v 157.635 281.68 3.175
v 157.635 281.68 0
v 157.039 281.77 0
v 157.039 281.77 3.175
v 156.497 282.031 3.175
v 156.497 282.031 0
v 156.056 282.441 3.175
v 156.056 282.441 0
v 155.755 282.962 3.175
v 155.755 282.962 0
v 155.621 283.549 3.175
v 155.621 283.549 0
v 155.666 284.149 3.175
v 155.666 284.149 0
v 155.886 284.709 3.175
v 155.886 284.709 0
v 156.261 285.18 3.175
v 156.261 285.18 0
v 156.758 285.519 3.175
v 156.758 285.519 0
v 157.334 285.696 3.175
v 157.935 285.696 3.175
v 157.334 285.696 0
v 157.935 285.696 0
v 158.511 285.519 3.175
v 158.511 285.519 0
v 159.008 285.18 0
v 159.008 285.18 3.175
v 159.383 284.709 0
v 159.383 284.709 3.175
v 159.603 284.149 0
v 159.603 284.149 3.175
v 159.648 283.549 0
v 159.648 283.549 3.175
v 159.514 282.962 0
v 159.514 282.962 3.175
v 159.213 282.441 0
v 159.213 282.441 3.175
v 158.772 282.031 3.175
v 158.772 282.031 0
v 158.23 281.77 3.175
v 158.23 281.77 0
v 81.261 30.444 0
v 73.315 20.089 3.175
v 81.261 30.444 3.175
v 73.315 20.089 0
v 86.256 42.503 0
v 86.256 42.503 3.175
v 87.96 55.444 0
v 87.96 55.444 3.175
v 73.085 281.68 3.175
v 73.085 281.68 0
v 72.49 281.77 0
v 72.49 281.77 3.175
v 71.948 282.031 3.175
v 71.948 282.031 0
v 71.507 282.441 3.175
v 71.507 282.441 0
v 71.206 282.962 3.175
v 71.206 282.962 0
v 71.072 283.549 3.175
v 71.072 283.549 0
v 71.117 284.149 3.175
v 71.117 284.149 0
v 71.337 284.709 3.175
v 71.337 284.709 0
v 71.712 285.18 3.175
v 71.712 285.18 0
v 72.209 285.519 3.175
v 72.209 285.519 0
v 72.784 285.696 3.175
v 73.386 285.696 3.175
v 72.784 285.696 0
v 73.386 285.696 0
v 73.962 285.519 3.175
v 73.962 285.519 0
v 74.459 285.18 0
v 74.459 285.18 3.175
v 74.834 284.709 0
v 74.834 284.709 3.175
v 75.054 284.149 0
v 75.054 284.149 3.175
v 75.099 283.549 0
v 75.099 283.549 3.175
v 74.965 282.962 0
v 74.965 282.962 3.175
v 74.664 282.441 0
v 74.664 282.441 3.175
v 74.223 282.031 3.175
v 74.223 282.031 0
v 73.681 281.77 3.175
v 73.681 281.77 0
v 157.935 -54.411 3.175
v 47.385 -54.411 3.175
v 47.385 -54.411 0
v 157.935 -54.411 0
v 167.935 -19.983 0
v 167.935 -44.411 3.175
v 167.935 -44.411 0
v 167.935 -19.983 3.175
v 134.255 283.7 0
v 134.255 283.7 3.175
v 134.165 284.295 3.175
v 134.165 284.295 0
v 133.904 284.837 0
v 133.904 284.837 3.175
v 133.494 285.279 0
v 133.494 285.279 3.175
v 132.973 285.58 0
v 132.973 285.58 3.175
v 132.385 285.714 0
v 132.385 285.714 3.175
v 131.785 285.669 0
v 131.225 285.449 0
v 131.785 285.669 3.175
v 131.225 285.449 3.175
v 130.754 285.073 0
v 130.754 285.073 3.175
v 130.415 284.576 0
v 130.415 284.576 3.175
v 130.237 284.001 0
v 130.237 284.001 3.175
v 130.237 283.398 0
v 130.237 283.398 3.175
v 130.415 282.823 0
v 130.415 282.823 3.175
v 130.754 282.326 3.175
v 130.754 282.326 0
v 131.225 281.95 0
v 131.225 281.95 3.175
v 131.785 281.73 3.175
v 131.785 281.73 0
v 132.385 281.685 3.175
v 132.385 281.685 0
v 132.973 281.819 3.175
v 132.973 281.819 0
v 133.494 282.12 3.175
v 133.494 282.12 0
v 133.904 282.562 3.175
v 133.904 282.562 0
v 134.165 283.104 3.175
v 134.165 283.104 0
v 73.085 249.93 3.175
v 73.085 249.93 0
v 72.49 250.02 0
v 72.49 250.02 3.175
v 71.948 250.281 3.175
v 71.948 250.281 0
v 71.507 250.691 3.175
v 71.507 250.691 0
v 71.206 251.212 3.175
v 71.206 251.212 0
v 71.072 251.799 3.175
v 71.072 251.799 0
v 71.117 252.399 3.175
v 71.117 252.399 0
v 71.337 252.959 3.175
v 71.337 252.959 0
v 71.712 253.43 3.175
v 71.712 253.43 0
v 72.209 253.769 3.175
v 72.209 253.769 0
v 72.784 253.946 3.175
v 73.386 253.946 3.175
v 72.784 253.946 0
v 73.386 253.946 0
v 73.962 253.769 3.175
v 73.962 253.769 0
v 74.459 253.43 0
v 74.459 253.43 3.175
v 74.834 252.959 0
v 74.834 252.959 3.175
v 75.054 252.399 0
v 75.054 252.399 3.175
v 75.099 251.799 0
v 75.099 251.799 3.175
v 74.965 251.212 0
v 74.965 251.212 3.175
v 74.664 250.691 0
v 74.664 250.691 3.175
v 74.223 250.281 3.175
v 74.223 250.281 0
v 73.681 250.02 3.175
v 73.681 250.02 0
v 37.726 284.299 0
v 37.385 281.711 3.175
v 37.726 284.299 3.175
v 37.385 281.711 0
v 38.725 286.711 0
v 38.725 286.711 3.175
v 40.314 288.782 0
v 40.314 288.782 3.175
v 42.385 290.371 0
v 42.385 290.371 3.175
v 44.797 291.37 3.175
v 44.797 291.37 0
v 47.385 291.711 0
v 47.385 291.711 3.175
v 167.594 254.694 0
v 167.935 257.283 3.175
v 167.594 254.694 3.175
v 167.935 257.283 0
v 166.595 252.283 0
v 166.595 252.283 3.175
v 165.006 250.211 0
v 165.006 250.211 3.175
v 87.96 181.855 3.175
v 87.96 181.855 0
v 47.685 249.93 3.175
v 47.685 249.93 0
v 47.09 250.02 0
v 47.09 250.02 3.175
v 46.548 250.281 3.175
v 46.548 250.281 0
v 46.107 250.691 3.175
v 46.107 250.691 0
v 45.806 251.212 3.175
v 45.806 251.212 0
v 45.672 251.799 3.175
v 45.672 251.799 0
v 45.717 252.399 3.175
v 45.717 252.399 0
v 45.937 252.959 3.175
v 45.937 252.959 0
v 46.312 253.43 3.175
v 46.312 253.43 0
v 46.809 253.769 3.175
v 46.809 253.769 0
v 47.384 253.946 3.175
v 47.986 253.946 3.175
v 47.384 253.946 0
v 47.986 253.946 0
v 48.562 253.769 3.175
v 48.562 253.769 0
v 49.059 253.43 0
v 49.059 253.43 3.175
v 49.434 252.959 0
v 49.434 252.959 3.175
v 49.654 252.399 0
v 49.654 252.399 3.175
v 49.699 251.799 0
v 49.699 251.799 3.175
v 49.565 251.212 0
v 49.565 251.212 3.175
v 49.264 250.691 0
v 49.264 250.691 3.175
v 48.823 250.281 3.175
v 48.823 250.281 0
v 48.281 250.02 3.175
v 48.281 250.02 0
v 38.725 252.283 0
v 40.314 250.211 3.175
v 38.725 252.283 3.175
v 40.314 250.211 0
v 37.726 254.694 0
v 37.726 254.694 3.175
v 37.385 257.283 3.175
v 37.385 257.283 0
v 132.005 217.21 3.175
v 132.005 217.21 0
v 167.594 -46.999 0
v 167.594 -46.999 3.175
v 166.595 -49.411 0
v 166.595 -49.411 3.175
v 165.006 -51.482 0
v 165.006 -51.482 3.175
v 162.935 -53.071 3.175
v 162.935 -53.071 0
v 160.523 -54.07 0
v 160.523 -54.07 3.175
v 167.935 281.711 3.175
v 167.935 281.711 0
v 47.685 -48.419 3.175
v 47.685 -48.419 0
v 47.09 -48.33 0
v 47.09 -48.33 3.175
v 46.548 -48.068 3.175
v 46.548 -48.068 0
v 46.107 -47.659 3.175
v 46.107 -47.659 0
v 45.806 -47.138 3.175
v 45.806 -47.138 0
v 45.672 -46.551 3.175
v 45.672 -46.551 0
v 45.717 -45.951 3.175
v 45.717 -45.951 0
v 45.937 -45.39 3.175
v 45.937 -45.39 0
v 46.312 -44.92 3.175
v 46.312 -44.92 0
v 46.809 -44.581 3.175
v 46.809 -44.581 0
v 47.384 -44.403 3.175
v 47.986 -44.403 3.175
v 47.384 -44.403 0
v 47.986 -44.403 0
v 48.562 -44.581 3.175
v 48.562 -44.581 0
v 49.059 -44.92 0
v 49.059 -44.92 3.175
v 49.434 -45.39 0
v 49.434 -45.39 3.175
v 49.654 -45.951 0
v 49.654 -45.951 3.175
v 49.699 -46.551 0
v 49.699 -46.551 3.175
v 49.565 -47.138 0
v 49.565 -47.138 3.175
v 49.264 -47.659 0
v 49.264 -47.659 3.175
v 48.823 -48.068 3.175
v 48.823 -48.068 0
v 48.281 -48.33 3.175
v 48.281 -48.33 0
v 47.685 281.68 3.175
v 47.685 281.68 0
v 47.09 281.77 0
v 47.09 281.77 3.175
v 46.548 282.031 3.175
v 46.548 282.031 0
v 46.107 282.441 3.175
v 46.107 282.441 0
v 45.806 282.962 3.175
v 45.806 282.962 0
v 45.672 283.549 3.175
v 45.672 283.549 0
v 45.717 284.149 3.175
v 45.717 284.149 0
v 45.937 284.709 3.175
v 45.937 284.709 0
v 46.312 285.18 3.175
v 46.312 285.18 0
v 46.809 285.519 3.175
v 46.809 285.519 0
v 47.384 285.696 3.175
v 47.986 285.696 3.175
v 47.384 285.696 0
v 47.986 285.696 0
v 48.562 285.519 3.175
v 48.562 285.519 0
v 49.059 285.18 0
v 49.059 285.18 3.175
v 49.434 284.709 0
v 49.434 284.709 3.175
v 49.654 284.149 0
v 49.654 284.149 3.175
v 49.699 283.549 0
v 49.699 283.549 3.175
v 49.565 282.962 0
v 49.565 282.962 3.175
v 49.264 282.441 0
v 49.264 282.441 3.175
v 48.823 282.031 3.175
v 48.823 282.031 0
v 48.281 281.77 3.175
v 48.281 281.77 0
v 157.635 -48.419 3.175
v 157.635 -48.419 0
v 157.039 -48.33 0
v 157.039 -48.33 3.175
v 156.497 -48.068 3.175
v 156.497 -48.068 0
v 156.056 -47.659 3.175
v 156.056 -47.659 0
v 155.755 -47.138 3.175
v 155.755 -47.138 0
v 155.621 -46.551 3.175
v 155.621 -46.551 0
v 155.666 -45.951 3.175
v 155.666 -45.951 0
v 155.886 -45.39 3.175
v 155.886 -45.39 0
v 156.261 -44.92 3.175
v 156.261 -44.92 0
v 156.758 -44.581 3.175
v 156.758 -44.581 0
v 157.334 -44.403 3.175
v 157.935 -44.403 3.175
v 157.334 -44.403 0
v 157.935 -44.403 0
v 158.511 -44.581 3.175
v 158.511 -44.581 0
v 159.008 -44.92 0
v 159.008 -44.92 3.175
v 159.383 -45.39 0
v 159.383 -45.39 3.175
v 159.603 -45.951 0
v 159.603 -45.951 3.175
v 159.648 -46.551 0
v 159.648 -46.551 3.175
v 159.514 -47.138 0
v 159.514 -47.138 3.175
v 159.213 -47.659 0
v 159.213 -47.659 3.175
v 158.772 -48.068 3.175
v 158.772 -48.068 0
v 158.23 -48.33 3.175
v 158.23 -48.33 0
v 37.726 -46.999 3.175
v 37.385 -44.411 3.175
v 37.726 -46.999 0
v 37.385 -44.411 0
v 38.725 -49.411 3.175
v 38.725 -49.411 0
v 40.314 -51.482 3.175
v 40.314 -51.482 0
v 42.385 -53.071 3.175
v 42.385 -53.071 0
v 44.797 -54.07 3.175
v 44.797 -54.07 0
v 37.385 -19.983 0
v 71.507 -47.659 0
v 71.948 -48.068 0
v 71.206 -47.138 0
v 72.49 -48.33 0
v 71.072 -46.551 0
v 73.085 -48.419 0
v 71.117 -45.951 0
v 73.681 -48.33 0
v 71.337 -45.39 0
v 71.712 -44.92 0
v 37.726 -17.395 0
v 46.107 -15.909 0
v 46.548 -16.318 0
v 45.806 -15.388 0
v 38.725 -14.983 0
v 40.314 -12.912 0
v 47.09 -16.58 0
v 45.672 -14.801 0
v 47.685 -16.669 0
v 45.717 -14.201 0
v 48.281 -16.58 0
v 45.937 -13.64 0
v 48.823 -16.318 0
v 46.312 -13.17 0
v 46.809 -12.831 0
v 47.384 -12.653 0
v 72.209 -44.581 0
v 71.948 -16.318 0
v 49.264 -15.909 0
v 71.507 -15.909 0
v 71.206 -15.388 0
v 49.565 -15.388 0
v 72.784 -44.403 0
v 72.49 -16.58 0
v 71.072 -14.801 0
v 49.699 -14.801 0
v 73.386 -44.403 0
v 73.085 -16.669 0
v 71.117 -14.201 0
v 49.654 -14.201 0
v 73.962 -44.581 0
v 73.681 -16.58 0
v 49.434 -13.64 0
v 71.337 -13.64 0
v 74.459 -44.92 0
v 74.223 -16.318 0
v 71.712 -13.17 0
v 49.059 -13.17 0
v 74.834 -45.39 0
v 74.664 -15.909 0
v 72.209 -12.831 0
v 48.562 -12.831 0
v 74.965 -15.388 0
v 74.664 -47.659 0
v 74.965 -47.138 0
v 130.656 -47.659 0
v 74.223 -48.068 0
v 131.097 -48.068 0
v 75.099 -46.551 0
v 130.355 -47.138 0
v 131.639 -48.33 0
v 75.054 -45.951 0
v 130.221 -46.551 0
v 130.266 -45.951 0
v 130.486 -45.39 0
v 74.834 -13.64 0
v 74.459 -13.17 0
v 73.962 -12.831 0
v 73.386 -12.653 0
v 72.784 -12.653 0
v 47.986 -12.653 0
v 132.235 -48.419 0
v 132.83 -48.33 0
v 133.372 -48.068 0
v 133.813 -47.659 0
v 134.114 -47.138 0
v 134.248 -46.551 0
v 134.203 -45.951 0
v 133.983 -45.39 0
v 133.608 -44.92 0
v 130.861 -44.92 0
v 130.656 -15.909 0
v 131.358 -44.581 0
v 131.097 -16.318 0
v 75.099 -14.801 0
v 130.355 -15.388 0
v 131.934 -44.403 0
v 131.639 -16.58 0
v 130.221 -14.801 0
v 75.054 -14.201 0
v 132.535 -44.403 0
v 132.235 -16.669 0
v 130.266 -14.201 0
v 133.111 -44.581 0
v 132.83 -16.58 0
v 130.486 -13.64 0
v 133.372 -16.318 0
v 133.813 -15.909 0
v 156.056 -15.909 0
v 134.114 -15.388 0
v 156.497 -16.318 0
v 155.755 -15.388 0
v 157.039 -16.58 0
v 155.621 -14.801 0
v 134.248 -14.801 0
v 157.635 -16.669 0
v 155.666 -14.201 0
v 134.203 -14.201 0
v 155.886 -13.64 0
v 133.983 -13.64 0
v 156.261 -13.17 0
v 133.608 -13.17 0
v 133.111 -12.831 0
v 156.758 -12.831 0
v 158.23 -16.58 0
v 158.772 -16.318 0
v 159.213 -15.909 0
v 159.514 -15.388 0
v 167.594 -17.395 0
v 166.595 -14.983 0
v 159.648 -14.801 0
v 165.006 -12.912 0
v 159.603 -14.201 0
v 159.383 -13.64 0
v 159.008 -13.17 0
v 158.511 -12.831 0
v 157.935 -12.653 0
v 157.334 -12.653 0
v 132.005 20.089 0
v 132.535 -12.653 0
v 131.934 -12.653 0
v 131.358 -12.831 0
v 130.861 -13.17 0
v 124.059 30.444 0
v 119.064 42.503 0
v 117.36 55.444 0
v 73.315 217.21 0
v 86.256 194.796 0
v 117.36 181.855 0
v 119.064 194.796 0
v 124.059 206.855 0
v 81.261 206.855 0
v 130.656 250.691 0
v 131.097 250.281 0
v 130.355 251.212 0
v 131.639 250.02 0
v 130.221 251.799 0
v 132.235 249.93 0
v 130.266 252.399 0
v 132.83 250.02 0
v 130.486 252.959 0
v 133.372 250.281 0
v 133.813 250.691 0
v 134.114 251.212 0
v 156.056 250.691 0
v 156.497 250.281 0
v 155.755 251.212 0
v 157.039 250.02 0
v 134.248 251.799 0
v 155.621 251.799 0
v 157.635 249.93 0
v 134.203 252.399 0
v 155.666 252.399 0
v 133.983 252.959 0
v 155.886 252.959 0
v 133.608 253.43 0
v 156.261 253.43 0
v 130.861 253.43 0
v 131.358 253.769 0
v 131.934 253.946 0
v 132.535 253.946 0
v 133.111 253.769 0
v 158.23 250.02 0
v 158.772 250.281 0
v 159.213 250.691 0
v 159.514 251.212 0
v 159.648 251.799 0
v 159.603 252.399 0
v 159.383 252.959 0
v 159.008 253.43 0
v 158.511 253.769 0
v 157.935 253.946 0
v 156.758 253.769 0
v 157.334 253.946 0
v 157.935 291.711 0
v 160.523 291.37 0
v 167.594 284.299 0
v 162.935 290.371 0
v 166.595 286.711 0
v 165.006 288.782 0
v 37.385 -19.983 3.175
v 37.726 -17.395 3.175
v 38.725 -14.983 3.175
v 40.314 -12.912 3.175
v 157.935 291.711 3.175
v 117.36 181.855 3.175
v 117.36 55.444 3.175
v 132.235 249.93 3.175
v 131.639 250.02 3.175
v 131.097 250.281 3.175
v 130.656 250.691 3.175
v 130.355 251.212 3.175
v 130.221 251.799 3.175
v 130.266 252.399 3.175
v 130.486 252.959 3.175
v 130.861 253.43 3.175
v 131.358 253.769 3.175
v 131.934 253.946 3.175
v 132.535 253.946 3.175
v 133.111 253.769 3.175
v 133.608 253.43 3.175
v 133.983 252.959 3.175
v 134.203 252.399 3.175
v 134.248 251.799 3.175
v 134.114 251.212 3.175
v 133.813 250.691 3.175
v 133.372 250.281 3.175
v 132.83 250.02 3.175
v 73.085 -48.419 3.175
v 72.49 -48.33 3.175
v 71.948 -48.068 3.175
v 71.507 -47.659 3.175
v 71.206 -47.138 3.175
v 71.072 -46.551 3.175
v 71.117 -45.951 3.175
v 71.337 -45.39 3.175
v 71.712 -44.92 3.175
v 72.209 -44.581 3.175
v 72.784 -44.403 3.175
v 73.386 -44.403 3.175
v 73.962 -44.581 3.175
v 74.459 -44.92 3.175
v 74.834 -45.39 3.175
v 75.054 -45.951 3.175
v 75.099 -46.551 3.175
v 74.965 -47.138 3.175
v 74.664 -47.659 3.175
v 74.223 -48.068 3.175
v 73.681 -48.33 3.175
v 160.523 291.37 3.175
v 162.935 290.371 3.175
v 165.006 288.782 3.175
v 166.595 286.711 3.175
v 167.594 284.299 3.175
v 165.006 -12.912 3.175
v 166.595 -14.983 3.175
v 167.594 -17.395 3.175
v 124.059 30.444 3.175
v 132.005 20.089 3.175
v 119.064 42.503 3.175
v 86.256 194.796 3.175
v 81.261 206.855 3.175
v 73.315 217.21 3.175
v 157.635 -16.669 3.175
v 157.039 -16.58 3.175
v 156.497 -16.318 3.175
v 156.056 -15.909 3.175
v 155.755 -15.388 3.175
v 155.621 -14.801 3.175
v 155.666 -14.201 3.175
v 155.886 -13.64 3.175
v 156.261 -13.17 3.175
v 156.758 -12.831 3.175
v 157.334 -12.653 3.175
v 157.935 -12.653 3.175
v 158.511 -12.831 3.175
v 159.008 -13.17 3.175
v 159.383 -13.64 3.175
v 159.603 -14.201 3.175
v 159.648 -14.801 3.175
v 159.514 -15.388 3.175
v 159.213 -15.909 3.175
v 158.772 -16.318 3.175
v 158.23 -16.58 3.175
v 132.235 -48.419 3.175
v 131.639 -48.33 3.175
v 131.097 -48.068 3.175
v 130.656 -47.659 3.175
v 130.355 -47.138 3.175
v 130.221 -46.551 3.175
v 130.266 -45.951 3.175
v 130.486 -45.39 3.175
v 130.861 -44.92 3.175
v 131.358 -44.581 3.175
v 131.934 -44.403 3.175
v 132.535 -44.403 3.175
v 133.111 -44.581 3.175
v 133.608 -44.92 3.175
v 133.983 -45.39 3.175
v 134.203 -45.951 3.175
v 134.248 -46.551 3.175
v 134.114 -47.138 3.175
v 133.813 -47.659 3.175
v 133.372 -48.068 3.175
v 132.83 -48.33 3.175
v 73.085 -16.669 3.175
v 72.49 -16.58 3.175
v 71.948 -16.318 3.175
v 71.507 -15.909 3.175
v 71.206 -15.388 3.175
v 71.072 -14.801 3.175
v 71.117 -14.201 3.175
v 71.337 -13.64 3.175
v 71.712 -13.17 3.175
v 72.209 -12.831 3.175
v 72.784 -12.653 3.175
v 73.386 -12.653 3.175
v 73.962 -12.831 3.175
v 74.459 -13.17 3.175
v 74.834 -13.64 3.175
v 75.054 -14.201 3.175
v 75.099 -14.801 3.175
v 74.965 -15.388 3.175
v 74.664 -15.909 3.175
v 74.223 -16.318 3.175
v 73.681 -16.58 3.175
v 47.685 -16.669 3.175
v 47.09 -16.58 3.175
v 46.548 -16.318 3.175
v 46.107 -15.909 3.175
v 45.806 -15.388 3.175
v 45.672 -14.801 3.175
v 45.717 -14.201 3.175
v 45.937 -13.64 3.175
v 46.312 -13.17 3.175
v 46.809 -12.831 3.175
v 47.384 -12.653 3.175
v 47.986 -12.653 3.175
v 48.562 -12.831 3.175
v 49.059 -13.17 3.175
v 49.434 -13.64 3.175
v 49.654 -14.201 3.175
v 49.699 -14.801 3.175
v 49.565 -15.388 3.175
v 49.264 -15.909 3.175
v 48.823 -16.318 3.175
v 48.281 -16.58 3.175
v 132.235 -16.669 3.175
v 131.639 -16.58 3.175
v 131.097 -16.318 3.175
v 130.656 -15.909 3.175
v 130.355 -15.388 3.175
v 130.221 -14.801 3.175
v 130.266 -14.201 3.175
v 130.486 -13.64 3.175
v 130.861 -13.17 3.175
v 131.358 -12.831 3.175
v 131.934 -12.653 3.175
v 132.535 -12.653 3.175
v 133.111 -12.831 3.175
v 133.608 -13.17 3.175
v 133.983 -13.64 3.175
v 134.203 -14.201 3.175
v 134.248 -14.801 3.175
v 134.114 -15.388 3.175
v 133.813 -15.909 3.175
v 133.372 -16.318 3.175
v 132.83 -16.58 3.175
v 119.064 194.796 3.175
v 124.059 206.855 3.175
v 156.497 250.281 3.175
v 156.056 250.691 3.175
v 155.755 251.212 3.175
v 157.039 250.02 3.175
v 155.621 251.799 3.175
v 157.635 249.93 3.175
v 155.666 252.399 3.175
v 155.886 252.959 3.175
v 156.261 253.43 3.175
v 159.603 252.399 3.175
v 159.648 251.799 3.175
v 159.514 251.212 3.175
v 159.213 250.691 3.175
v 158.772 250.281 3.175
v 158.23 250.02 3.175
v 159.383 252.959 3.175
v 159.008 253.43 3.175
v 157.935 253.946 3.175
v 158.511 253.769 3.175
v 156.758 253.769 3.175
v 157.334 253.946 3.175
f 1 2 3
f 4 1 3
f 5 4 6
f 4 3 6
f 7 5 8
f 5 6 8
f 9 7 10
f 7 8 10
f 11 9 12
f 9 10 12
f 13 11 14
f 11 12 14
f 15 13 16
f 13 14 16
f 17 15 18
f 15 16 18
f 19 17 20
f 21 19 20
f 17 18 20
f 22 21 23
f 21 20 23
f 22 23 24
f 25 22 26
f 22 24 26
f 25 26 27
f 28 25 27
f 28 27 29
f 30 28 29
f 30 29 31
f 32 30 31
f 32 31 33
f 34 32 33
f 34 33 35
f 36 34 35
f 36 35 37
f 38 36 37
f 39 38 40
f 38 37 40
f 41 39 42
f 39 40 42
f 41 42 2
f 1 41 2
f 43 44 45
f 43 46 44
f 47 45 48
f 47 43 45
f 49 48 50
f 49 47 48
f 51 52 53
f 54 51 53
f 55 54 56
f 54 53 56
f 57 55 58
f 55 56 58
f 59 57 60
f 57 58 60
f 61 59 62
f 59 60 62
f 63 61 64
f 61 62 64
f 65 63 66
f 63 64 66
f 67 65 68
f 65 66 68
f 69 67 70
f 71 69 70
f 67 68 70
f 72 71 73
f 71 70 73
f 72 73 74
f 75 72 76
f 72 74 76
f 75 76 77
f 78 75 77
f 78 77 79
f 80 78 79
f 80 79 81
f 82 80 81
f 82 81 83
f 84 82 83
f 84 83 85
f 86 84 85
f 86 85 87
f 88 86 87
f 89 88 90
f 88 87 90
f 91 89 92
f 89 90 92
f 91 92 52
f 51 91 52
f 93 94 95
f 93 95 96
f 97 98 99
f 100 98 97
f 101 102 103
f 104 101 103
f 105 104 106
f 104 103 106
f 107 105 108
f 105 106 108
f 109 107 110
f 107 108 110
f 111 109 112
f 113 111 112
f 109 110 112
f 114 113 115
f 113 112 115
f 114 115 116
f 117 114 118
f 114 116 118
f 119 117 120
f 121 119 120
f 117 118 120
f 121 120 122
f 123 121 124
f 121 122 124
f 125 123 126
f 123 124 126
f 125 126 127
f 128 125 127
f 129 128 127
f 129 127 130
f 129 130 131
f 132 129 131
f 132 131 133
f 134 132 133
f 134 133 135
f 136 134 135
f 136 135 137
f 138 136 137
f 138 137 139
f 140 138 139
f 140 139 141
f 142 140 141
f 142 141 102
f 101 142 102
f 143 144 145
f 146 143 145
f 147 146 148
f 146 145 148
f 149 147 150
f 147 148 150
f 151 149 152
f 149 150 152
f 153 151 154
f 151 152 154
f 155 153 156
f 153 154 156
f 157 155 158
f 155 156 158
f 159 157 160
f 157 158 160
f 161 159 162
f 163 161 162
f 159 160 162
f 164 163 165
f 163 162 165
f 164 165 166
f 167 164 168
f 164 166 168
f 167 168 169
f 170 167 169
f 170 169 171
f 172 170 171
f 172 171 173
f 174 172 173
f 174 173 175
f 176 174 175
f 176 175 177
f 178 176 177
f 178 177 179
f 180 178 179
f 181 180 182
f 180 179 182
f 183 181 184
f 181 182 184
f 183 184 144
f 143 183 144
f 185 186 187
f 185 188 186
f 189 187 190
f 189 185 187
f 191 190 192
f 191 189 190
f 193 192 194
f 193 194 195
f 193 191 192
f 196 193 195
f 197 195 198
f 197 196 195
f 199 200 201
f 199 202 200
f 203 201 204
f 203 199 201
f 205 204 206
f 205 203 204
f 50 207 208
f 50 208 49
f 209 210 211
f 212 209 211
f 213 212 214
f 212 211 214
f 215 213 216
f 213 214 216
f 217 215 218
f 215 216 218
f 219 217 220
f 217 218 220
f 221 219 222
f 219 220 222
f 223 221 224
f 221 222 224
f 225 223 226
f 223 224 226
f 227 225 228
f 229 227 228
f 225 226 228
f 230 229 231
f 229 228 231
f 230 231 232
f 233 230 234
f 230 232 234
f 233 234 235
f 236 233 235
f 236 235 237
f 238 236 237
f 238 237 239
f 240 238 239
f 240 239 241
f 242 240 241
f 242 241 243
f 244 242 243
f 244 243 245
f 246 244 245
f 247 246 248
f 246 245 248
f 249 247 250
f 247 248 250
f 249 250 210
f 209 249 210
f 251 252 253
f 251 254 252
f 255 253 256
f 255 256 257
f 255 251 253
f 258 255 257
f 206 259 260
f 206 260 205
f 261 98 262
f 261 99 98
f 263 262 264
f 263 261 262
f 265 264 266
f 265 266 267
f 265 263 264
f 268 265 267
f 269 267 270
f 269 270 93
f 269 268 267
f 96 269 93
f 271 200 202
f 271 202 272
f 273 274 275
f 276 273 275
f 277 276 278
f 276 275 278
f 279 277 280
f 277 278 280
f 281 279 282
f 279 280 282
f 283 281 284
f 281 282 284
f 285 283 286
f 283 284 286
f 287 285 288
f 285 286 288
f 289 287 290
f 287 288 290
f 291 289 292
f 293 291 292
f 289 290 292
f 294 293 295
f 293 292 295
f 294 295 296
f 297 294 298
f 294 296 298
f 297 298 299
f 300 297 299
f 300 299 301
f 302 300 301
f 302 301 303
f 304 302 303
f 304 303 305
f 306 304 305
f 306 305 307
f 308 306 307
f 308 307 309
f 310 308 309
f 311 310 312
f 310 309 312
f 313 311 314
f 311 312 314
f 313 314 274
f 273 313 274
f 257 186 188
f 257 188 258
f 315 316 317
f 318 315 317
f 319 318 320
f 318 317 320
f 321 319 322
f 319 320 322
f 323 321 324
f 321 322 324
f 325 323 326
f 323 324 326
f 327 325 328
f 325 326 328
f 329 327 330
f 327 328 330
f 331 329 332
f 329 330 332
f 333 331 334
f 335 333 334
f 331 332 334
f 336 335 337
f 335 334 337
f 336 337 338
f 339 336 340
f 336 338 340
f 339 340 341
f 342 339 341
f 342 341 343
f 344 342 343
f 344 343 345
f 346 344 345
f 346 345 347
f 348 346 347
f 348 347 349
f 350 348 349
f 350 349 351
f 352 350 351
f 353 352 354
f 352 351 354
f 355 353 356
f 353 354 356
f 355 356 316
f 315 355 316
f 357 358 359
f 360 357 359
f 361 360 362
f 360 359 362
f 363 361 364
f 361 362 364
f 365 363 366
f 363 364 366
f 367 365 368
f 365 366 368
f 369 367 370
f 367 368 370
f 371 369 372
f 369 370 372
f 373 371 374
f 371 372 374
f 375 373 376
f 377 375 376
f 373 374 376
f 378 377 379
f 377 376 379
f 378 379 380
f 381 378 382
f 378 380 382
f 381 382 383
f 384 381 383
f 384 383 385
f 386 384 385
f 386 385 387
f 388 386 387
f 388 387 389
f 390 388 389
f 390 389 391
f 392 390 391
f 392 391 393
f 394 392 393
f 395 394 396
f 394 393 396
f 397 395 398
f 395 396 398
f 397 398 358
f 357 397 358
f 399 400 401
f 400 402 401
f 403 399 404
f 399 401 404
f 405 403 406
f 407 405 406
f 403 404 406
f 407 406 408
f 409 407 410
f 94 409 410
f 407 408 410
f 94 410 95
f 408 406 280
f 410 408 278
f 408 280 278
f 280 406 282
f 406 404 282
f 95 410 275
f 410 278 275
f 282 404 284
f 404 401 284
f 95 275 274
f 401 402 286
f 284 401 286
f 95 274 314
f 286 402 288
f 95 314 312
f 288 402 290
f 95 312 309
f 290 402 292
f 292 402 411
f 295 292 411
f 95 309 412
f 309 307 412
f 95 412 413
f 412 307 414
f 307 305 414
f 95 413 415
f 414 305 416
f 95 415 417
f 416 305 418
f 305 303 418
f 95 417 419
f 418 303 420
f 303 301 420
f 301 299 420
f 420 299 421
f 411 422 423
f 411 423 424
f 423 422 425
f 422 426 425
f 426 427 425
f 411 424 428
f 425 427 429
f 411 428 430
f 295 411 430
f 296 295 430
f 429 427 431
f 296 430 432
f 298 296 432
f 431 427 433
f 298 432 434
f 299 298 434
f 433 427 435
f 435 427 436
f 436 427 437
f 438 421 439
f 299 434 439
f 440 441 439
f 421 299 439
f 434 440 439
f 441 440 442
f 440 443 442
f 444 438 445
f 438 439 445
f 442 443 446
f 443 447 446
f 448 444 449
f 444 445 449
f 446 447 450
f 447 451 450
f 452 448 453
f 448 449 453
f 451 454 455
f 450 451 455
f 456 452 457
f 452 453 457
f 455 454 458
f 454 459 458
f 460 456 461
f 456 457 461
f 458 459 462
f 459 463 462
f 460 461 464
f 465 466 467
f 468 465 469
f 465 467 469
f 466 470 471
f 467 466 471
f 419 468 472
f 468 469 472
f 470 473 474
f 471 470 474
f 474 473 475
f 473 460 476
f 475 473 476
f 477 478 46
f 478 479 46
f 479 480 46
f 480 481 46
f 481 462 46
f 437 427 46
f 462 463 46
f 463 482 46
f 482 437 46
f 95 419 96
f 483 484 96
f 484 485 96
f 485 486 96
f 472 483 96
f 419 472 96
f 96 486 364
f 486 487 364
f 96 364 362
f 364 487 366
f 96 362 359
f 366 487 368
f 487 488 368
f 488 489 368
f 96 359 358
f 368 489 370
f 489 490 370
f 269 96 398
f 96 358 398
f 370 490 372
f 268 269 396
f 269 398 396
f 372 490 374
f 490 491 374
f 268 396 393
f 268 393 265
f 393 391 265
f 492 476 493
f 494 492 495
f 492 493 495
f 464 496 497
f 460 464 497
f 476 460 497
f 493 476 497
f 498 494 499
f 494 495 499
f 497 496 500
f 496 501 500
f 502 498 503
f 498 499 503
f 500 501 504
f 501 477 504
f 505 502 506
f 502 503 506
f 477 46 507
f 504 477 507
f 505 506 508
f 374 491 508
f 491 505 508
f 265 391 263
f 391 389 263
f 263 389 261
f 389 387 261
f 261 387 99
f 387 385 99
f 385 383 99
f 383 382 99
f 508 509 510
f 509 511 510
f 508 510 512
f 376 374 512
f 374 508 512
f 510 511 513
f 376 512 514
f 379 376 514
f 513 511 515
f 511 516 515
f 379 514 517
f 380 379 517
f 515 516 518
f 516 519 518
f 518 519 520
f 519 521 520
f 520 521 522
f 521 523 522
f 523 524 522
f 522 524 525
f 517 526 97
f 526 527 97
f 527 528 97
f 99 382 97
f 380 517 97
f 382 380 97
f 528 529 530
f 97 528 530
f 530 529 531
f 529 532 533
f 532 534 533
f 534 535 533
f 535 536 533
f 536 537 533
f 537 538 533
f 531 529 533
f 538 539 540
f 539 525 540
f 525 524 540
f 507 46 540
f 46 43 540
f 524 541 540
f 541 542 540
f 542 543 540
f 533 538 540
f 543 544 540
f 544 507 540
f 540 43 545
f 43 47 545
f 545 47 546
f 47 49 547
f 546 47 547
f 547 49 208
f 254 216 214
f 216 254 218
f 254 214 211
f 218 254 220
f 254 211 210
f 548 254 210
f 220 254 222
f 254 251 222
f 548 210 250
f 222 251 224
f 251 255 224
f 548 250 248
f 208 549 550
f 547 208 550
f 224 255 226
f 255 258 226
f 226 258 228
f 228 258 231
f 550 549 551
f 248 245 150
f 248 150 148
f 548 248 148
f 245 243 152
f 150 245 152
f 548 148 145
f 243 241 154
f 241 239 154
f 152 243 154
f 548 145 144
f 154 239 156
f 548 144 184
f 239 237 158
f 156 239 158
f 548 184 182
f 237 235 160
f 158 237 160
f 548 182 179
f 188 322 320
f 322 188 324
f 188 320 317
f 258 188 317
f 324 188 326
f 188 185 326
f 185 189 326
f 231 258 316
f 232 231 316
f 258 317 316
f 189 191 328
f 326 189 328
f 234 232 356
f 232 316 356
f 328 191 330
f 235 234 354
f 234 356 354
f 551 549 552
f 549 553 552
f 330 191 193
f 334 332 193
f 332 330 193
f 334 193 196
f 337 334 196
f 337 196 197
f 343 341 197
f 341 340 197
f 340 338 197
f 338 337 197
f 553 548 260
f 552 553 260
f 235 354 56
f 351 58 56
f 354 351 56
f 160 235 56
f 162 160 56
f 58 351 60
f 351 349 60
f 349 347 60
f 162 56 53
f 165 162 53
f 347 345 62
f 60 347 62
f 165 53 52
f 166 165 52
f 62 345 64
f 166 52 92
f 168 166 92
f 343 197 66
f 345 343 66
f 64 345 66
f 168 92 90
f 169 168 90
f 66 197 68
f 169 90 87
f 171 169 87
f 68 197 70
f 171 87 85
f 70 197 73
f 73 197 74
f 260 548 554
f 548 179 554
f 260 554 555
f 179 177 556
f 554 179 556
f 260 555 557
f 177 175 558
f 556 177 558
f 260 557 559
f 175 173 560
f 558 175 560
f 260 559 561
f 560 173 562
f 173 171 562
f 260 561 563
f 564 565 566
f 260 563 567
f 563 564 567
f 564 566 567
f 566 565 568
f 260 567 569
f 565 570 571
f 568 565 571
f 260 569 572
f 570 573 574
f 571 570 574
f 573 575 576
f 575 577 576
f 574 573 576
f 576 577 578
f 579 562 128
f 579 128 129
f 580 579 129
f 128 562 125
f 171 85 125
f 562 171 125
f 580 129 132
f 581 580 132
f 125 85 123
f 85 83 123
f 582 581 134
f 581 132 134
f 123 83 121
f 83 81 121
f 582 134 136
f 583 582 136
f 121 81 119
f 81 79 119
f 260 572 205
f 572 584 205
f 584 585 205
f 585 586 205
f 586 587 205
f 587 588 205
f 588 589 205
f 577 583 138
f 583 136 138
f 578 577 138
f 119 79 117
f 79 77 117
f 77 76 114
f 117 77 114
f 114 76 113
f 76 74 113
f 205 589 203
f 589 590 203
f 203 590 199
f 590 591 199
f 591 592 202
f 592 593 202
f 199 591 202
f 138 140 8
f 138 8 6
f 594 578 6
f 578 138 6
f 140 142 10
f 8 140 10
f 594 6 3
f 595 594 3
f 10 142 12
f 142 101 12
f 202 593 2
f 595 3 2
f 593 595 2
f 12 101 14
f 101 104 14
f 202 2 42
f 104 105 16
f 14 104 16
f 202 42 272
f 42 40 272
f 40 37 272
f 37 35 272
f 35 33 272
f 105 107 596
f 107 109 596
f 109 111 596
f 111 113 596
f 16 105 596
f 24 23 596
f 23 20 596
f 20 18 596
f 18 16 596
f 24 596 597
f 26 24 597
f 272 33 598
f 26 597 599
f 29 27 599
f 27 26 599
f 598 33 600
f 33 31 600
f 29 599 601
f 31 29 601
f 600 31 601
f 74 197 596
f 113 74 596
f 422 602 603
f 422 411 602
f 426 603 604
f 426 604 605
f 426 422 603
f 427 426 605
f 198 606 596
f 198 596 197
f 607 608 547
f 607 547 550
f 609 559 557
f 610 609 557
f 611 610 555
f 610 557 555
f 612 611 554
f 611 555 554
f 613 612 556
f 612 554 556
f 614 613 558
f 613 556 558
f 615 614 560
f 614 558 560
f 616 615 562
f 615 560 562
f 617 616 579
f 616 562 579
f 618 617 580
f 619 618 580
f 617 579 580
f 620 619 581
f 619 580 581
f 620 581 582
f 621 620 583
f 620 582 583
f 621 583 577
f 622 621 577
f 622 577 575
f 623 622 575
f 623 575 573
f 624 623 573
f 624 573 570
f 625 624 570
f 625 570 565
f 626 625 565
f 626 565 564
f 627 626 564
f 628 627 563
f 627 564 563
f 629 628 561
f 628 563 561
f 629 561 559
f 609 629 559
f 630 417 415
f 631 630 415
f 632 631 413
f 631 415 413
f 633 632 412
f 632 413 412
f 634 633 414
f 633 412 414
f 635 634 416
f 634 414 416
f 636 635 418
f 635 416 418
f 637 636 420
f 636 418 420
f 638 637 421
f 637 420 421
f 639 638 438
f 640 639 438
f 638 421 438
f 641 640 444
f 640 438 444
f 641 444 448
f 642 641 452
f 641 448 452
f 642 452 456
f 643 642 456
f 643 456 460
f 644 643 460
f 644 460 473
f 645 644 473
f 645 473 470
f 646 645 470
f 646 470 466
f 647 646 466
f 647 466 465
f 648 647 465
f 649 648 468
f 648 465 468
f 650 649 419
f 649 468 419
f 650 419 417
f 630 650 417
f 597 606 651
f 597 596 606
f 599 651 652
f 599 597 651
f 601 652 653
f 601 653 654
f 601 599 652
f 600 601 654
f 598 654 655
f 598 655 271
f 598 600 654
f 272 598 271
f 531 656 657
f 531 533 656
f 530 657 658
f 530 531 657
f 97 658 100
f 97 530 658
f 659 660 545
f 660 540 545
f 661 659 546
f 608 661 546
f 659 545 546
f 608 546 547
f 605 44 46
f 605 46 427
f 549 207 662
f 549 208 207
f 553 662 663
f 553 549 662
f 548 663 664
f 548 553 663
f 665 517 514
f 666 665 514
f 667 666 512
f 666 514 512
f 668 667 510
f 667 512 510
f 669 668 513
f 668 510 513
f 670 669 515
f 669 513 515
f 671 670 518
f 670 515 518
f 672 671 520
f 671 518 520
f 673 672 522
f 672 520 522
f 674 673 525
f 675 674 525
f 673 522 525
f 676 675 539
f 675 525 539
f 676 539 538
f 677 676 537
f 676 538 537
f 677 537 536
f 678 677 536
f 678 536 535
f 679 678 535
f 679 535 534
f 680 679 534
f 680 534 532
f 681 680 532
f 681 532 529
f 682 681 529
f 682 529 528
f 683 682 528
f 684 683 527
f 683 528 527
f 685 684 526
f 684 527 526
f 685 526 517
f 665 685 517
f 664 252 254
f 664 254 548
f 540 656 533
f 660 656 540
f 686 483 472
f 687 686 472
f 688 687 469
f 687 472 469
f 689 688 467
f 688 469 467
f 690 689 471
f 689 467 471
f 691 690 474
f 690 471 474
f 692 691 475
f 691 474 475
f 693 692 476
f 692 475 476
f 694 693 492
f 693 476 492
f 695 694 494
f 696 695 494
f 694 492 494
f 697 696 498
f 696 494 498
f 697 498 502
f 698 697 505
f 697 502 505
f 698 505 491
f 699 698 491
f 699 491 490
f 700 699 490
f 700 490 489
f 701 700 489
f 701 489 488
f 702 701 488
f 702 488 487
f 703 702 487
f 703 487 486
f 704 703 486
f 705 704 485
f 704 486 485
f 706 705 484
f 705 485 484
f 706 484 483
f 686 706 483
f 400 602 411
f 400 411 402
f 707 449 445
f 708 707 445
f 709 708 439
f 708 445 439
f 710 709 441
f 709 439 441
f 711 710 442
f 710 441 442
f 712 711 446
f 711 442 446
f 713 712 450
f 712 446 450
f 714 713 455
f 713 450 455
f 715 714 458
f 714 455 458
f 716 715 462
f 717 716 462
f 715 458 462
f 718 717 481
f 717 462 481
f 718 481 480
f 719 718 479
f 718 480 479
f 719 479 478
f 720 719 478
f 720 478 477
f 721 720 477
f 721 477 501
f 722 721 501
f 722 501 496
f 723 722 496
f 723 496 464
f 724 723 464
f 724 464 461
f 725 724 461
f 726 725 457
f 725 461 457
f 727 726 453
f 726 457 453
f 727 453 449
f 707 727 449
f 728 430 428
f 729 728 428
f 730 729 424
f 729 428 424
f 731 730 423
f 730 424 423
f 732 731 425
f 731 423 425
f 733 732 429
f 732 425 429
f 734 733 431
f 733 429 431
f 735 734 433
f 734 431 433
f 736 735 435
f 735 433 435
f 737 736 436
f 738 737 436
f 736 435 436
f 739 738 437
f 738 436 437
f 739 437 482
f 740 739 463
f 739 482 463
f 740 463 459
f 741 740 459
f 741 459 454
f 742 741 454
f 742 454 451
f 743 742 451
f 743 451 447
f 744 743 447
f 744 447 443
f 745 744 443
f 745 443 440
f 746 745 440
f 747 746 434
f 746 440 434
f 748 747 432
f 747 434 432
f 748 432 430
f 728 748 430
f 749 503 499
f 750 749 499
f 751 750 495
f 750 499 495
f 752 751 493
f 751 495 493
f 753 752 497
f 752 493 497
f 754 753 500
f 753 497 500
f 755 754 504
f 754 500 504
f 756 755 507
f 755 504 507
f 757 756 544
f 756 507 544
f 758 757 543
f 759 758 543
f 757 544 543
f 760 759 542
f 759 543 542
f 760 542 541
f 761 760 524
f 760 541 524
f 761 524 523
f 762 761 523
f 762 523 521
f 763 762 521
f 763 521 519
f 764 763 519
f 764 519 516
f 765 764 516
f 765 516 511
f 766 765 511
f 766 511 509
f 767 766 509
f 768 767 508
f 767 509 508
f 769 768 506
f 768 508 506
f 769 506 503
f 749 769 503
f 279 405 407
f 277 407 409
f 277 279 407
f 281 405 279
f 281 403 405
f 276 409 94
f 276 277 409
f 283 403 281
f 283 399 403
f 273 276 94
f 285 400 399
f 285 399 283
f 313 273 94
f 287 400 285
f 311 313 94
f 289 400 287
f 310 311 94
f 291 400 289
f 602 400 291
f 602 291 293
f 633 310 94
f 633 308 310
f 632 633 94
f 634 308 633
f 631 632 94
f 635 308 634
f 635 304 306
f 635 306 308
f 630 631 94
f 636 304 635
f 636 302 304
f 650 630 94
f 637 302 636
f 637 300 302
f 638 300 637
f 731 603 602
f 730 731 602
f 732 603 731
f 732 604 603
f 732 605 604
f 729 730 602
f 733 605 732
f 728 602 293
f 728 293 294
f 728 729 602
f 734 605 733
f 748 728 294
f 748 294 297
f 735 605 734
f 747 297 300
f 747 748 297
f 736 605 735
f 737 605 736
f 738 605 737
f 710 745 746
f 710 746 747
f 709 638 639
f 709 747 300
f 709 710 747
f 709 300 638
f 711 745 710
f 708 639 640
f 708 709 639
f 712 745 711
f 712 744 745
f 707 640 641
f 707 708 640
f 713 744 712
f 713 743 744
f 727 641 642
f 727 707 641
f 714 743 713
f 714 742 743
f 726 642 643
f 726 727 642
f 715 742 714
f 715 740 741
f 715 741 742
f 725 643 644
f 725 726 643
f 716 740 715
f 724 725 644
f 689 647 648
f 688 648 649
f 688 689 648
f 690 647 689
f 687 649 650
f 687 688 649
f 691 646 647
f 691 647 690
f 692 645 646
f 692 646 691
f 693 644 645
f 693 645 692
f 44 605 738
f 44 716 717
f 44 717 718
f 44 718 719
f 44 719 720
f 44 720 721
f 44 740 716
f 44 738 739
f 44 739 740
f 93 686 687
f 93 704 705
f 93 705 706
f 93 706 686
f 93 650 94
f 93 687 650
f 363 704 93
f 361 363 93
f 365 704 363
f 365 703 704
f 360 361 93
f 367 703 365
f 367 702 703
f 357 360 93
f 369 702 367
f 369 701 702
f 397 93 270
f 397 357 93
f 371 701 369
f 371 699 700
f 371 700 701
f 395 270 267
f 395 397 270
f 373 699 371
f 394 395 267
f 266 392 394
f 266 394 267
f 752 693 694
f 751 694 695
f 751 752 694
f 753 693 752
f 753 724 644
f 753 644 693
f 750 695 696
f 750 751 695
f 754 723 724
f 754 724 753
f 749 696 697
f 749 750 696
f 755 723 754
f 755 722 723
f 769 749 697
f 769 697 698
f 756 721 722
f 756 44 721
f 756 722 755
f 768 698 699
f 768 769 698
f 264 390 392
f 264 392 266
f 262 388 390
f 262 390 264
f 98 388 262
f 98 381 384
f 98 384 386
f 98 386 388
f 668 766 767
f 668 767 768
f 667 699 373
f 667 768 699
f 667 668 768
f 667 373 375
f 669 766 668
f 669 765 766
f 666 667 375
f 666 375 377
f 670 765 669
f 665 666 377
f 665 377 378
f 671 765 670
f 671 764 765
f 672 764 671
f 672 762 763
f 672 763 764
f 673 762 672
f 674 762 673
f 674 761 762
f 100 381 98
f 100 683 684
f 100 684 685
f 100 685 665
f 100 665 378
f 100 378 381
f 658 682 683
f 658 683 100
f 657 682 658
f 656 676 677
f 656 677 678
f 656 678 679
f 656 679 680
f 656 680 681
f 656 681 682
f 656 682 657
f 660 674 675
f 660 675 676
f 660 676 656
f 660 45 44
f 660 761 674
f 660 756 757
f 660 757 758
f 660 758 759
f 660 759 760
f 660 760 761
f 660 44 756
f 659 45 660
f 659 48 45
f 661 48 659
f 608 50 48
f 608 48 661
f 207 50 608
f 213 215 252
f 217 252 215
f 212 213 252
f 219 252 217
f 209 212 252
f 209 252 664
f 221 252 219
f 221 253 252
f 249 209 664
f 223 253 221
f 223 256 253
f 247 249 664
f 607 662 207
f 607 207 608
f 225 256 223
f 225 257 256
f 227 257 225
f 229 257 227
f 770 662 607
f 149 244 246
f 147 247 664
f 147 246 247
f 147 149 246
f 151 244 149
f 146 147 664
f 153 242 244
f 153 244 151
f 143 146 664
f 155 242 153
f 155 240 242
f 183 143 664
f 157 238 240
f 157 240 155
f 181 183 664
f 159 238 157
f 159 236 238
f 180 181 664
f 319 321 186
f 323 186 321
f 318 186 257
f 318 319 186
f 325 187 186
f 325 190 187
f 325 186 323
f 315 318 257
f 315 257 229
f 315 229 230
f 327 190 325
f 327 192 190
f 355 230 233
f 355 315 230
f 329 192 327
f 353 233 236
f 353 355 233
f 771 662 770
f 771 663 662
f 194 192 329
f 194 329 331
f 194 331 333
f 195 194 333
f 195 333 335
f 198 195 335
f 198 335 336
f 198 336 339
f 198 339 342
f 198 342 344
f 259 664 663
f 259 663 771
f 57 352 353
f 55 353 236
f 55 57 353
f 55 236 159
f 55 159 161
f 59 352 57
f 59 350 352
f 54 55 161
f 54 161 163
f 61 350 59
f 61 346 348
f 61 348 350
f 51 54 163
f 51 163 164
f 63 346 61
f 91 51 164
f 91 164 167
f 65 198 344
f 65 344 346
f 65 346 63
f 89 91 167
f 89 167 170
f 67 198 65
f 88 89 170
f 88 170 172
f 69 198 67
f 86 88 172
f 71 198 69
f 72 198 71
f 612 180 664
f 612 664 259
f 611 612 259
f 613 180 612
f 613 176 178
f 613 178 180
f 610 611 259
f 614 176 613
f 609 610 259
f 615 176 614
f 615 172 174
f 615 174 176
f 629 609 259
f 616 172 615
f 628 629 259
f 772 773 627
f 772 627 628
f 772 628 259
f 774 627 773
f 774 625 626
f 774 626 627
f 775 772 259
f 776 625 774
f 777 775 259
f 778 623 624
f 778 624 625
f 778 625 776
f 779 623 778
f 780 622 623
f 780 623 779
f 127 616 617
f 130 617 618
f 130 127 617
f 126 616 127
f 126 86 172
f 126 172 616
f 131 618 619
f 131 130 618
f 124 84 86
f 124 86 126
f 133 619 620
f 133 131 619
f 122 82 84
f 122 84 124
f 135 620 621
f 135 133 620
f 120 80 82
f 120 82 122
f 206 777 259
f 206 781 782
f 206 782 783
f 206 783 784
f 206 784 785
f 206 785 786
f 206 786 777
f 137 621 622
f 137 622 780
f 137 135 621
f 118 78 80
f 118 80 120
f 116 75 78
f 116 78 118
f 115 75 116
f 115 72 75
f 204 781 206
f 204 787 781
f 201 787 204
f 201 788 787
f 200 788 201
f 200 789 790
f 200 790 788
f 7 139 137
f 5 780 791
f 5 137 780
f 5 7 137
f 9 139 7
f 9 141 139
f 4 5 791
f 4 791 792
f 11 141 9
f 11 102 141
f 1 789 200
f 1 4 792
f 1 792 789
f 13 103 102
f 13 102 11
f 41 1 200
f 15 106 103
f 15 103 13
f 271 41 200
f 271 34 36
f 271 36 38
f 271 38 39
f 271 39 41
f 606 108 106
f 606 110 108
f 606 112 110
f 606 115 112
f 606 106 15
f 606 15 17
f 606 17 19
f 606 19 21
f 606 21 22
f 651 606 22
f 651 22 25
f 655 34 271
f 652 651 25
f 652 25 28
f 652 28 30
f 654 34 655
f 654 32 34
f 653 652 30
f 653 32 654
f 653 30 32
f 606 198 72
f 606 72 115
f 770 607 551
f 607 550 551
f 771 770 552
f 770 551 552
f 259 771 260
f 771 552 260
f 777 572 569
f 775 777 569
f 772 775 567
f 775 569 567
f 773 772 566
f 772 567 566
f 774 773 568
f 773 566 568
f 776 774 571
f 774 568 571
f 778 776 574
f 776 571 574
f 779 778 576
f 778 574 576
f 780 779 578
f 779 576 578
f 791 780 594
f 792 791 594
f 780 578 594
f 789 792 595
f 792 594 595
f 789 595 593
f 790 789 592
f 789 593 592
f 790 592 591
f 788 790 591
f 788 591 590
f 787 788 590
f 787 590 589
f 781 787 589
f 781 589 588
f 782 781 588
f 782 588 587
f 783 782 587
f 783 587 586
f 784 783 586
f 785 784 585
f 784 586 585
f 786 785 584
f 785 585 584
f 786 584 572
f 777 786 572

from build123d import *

# Parameters (mm, degrees)
BOSS_EXTRUDE1_DEPTH = 3.175
CUT_EXTRUDE1_DEPTH  = 10
SKETCH3_R           = 2.0193
BOSS_EXTRUDE2_DEPTH = 3.175
FILLET1_R           = 10
FILLET2_R           = 50
SKETCH4_R           = 2.02
CUT_EXTRUDE2_DEPTH  = 10


with BuildPart() as part:
    # Sketch1 → Boss-Extrude1 (new body)
    with BuildSketch(Plane.XY):
        Polygon((165.934536959, -16.66935), (157.315236959, -8.05005), (115.359952094, -8.05005), (89.959952094, -8.05005), (48.004667228, -8.05005), (39.385367228, -16.66935), (39.385367228, -40.05005), (39.385367228, -52.41105), (165.934536959, -56.67505), (165.934536959, -42.05005), align=None)
        with BuildLine():
            ThreePointArc((47.685367228, -44.38075), (49.704667228, -46.40005), (47.685367228, -48.41935))
            ThreePointArc((47.685367228, -48.41935), (45.666067228, -46.40005), (47.685367228, -44.38075))
        make_face(mode=Mode.SUBTRACT)
        with BuildLine():
            ThreePointArc((47.685367228, -12.63075), (49.704667228, -14.65005), (47.685367228, -16.66935))
            ThreePointArc((47.685367228, -16.66935), (45.666067228, -14.65005), (47.685367228, -12.63075))
        make_face(mode=Mode.SUBTRACT)
        with BuildLine():
            ThreePointArc((73.085367228, -44.38075), (75.104667228, -46.40005), (73.085367228, -48.41935))
            ThreePointArc((73.085367228, -48.41935), (71.066067228, -46.40005), (73.085367228, -44.38075))
        make_face(mode=Mode.SUBTRACT)
        with BuildLine():
            ThreePointArc((73.085367228, -12.63075), (75.104667228, -14.65005), (73.085367228, -16.66935))
            ThreePointArc((73.085367228, -16.66935), (71.066067228, -14.65005), (73.085367228, -12.63075))
        make_face(mode=Mode.SUBTRACT)
        with BuildLine():
            ThreePointArc((132.234536959, -44.38075), (134.253836959, -46.40005), (132.234536959, -48.41935))
            ThreePointArc((132.234536959, -48.41935), (130.215236959, -46.40005), (132.234536959, -44.38075))
        make_face(mode=Mode.SUBTRACT)
        with BuildLine():
            ThreePointArc((132.234536959, -12.63075), (134.253836959, -14.65005), (132.234536959, -16.66935))
            ThreePointArc((132.234536959, -16.66935), (130.215236959, -14.65005), (132.234536959, -12.63075))
        make_face(mode=Mode.SUBTRACT)
        with BuildLine():
            ThreePointArc((157.634536959, -44.38075), (159.653836959, -46.40005), (157.634536959, -48.41935))
            ThreePointArc((157.634536959, -48.41935), (155.615236959, -46.40005), (157.634536959, -44.38075))
        make_face(mode=Mode.SUBTRACT)
        with BuildLine():
            ThreePointArc((157.634536959, -12.63075), (159.653836959, -14.65005), (157.634536959, -16.66935))
            ThreePointArc((157.634536959, -16.66935), (155.615236959, -14.65005), (157.634536959, -12.63075))
        make_face(mode=Mode.SUBTRACT)
        Polygon((115.359952094, -8.05005), (157.315236959, -8.05005), (115.359952094, 33.905234866), align=None)
        Polygon((89.959952094, -8.05005), (115.359952094, -8.05005), (115.359952094, 33.905234866), (115.359952094, 203.394265134), (115.359952094, 245.34955), (89.959952094, 245.34955), (89.959952094, 203.394265134), (89.959952094, 33.905234866), align=None)
        Polygon((48.004667228, -8.05005), (89.959952094, -8.05005), (89.959952094, 33.905234866), align=None)
        Polygon((89.959952094, 245.34955), (115.359952094, 245.34955), (157.315236959, 245.34955), (165.934536959, 253.96885), (165.934536959, 279.34955), (165.934536959, 293.97455), (39.385367228, 289.71055), (39.385367228, 277.34955), (39.385367228, 253.96885), (48.004667228, 245.34955), align=None)
        with BuildLine():
            ThreePointArc((47.685367228, 253.96885), (49.704667228, 251.94955), (47.685367228, 249.93025))
            ThreePointArc((47.685367228, 249.93025), (45.666067228, 251.94955), (47.685367228, 253.96885))
        make_face(mode=Mode.SUBTRACT)
        with BuildLine():
            ThreePointArc((47.685367228, 285.71885), (49.704667228, 283.69955), (47.685367228, 281.68025))
            ThreePointArc((47.685367228, 281.68025), (45.666067228, 283.69955), (47.685367228, 285.71885))
        make_face(mode=Mode.SUBTRACT)
        with BuildLine():
            ThreePointArc((73.085367228, 253.96885), (75.104667228, 251.94955), (73.085367228, 249.93025))
            ThreePointArc((73.085367228, 249.93025), (71.066067228, 251.94955), (73.085367228, 253.96885))
        make_face(mode=Mode.SUBTRACT)
        with BuildLine():
            ThreePointArc((73.085367228, 285.71885), (75.104667228, 283.69955), (73.085367228, 281.68025))
            ThreePointArc((73.085367228, 281.68025), (71.066067228, 283.69955), (73.085367228, 285.71885))
        make_face(mode=Mode.SUBTRACT)
        with BuildLine():
            ThreePointArc((132.234536959, 253.96885), (134.253836959, 251.94955), (132.234536959, 249.93025))
            ThreePointArc((132.234536959, 249.93025), (130.215236959, 251.94955), (132.234536959, 253.96885))
        make_face(mode=Mode.SUBTRACT)
        with BuildLine():
            ThreePointArc((157.634536959, 253.96885), (159.653836959, 251.94955), (157.634536959, 249.93025))
            ThreePointArc((157.634536959, 249.93025), (155.615236959, 251.94955), (157.634536959, 253.96885))
        make_face(mode=Mode.SUBTRACT)
        with BuildLine():
            ThreePointArc((157.634536959, 285.71885), (159.653836959, 283.69955), (157.634536959, 281.68025))
            ThreePointArc((157.634536959, 281.68025), (155.615236959, 283.69955), (157.634536959, 285.71885))
        make_face(mode=Mode.SUBTRACT)
        Polygon((115.359952094, 245.34955), (115.359952094, 203.394265134), (157.315236959, 245.34955), align=None)
        Polygon((48.004667228, 245.34955), (89.959952094, 203.394265134), (89.959952094, 245.34955), align=None)
    extrude(amount=BOSS_EXTRUDE1_DEPTH)

    # Sketch2 → Cut-Extrude1 (cut)
    with BuildSketch(Plane.XY.offset(3.175)):
        Polygon((84.385367228, -52.41105), (39.385367228, -52.41105), (165.934536959, -56.67505), (165.934536959, -52.41105), (120.934536959, -52.41105), align=None)
        Polygon((120.934536959, 289.71055), (165.934536959, 289.71055), (165.934536959, 293.97455), (39.385367228, 289.71055), (84.385367228, 289.71055), align=None)
    extrude(amount=-CUT_EXTRUDE1_DEPTH, mode=Mode.SUBTRACT)

    # Sketch3 → Boss-Extrude2 (add)
    with BuildSketch(Plane.XY.offset(3.175)):
        Polygon((37.385367228, -15.840922875), (37.385367228, -54.41105), (167.934536959, -54.41105), (167.934536959, -15.840922875), (117.359952094, 34.73366199), (117.359952094, 202.56583801), (167.934536959, 253.140422875), (167.934536959, 291.71055), (37.385367228, 291.71055), (37.385367228, 253.140422875), (87.959952094, 202.56583801), (87.959952094, 34.73366199), align=None)
        with Locations((132.234536959, -46.40005)):
            Circle(SKETCH3_R, mode=Mode.SUBTRACT)
        with Locations((132.234536959, -14.65005)):
            Circle(SKETCH3_R, mode=Mode.SUBTRACT)
        with Locations((47.685367228, -14.65005)):
            Circle(SKETCH3_R, mode=Mode.SUBTRACT)
        with Locations((47.685367228, -46.40005)):
            Circle(SKETCH3_R, mode=Mode.SUBTRACT)
        with Locations((73.085367228, -46.40005)):
            Circle(SKETCH3_R, mode=Mode.SUBTRACT)
        with Locations((73.085367228, -14.65005)):
            Circle(SKETCH3_R, mode=Mode.SUBTRACT)
        with Locations((157.634536959, -14.65005)):
            Circle(SKETCH3_R, mode=Mode.SUBTRACT)
        with Locations((157.634536959, -46.40005)):
            Circle(SKETCH3_R, mode=Mode.SUBTRACT)
        with Locations((132.234536959, 251.94955)):
            Circle(SKETCH3_R, mode=Mode.SUBTRACT)
        with Locations((73.085367228, 251.94955)):
            Circle(SKETCH3_R, mode=Mode.SUBTRACT)
        with Locations((157.634536959, 251.94955)):
            Circle(SKETCH3_R, mode=Mode.SUBTRACT)
        with Locations((47.685367228, 251.94955)):
            Circle(SKETCH3_R, mode=Mode.SUBTRACT)
        with Locations((47.685367228, 283.69955)):
            Circle(SKETCH3_R, mode=Mode.SUBTRACT)
        with Locations((73.085367228, 283.69955)):
            Circle(SKETCH3_R, mode=Mode.SUBTRACT)
        with Locations((157.634536959, 283.69955)):
            Circle(SKETCH3_R, mode=Mode.SUBTRACT)
    extrude(amount=-BOSS_EXTRUDE2_DEPTH)

    # Fillet1
    fillet1_edges = [part.edges().sort_by_distance(p)[0] for p in [
        (37.385367228, -54.41105, 1.5875),
        (167.934536959, -54.41105, 1.5875),
        (167.934536959, -15.840922875, 1.5875),
        (167.934536959, 253.140422875, 1.5875),
        (167.934536959, 291.71055, 1.5875),
        (37.385367228, 291.71055, 1.5875),
        (37.385367228, 253.140422875, 1.5875),
        (37.385367228, -15.840922875, 1.5875),
    ]]
    fillet(fillet1_edges, radius=FILLET1_R)

    # Fillet2
    fillet2_edges = [part.edges().sort_by_distance(p)[0] for p in [
        (117.359952094, 34.73366199, 1.5875),
        (117.359952094, 202.56583801, 1.5875),
        (87.959952094, 202.56583801, 1.5875),
        (87.959952094, 34.73366199, 1.5875),
    ]]
    fillet(fillet2_edges, radius=FILLET2_R)

    # Sketch4 → Cut-Extrude2 (cut)
    with BuildSketch(Plane.XY.offset(3.175)):
        with Locations((132.234536959, 283.69955)):
            Circle(SKETCH4_R)
    extrude(amount=-CUT_EXTRUDE2_DEPTH, mode=Mode.SUBTRACT)


solid = part.part
